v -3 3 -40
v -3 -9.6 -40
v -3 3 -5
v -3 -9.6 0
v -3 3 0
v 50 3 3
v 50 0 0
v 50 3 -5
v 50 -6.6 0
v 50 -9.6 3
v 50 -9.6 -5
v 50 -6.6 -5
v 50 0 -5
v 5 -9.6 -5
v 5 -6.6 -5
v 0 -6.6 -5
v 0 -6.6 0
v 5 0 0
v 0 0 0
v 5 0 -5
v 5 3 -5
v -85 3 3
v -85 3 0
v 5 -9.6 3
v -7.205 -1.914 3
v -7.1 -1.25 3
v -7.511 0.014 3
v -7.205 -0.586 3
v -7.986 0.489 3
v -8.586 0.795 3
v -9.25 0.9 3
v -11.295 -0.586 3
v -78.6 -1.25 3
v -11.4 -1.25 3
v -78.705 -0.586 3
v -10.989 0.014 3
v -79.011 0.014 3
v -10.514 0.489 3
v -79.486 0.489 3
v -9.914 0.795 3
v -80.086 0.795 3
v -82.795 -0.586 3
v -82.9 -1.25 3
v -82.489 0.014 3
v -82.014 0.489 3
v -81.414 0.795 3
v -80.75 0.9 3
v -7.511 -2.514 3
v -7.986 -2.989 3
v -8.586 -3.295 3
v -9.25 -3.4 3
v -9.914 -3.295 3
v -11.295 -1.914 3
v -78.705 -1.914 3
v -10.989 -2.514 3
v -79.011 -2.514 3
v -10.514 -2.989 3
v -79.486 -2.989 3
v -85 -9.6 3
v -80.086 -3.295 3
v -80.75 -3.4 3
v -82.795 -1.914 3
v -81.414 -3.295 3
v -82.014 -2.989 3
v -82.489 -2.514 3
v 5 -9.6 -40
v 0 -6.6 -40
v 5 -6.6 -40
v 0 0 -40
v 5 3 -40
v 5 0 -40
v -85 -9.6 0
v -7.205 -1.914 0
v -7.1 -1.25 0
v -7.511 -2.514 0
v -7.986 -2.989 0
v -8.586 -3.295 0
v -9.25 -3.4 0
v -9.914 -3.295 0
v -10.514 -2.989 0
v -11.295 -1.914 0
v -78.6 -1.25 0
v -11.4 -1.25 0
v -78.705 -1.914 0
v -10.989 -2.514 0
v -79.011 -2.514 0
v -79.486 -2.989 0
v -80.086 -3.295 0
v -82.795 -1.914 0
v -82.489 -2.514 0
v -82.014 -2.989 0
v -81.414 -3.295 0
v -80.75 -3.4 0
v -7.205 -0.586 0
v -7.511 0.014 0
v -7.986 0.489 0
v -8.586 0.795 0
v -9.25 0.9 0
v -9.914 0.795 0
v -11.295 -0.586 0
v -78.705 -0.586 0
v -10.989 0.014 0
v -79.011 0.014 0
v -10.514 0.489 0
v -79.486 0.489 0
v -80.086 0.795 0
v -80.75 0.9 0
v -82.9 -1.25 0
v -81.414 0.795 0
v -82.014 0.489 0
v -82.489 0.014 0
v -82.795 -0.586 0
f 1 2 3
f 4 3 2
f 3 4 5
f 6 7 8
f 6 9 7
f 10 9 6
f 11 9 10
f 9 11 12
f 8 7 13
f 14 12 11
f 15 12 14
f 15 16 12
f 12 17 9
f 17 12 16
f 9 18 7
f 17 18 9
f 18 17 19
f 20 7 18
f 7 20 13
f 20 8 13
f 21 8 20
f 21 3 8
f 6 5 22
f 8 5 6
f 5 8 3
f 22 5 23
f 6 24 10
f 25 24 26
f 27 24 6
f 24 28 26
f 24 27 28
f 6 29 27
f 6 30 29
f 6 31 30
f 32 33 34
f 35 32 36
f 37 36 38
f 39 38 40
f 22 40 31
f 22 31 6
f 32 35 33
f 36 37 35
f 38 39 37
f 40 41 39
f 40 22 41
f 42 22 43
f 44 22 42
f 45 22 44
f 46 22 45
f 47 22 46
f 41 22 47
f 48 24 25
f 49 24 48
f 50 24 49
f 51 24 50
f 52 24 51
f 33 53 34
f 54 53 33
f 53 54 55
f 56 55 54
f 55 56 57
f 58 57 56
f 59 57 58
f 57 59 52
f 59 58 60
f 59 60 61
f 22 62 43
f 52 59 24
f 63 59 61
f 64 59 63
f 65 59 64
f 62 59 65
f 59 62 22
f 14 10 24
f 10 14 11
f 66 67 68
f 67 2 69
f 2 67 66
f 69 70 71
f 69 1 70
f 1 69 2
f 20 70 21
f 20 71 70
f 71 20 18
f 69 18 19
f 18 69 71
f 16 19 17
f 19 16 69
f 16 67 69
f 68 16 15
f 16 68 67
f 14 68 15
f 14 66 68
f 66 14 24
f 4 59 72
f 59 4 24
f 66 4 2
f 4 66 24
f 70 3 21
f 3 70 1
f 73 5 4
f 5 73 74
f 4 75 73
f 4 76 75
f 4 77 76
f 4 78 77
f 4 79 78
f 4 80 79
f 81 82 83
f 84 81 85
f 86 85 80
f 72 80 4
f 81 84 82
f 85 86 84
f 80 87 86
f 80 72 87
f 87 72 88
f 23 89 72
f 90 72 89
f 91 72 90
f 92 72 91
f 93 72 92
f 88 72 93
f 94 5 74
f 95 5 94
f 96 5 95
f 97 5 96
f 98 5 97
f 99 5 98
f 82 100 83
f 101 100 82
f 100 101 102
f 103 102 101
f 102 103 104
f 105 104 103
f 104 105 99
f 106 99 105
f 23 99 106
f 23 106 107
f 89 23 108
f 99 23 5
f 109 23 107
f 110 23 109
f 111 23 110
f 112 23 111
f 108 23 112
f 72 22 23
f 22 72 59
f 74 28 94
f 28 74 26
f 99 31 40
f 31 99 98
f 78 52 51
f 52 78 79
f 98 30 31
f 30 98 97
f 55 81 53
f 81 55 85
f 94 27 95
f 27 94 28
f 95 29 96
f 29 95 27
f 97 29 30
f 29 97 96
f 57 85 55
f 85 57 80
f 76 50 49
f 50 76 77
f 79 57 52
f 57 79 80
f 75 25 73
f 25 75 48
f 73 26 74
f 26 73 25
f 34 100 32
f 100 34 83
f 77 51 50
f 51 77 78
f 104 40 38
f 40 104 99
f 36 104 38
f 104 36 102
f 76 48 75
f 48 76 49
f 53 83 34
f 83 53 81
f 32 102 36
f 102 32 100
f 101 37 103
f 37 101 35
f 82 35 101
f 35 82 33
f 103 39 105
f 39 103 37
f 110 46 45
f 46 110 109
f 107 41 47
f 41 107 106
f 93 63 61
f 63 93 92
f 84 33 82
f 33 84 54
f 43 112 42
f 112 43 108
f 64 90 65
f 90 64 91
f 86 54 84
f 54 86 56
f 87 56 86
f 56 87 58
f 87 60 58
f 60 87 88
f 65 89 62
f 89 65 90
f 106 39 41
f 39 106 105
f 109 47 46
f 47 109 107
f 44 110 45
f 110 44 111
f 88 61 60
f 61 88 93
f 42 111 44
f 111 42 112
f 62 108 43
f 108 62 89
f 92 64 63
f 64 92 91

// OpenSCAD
// [FL_INDEX: keywords="openscad, 3d_parametric, M2_80mm_fan_side_mount, csg_solid" | COT="Parametric OpenSCAD design from 3DCodeverse"]
// Title: M2 80mm fan side mount

/* [General] */
layout = "mount"; // [mount, clamptest]
wall_thickness = 3;

/* [Clamp Dimensions] */
// Extra clearance for the clamp. Print off the clamp test first to see what is right for you.
clamp_clearance = .1;
// X axis is front to back on the M2.
clamp_x_length = 50;
// Z is left to right across the M2. 40mm is about as far as you can go before the extruder carriage will clonk into the mount at the end of its travel.
clamp_z_length = 40;
// How far the clamp should extend inward from the edge. 5mm is about as far as you can go before contacting the V rail.
lip_depth = 5;
// Thickness of the gantry platform. You should not have to change this; edit clamp_clearance instead.
clamp_gap = 6.5;


/* [Fan Dimensions] */
// Exterior width of the fan.
fan_width = 80;
// How far off from the front face of the clamp you want to offset the fan by.
fan_offset = 2;
fan_screw_diameter = 4.3;
fan_screw_clearance = .2;
fan_depth = 25;
// Extra length for the fan pegs to extend beyond the face of the fan.
fan_depth_extra = 2;
fan_screw_centers_length = 71.5;

/* [Hidden] */
fan_screw_border = (fan_width - fan_screw_centers_length - fan_screw_diameter) / 2;
fan_screw_center_offset = fan_screw_border + fan_screw_diameter/2;
slop = .1; // for avoiding coincident faces

module clamp(h, c = clamp_clearance) {
  linear_extrude(height = h)
  difference() {
    translate([-wall_thickness, -wall_thickness])
    square([clamp_gap + c + 2*wall_thickness, lip_depth + wall_thickness]);

    square([clamp_gap + c, lip_depth + slop]);
  }
}

module screw_insert() {
  rotate([180, 0, 0])
  cylinder(h = fan_depth + fan_depth_extra, r = fan_screw_diameter/2 - fan_screw_clearance);
}


module mount() {
  right_screw_x = -wall_thickness - fan_offset - fan_screw_center_offset;
  screws_y = wall_thickness - fan_screw_center_offset;

  difference() {
    union() {
      // x clamp (front to back)
      rotate([-90, 0, -90])
      translate([0, 0, -wall_thickness])
      clamp(clamp_x_length + wall_thickness);

      // y clamp (left to right)
      rotate([180, 0, 90])
      translate([-(clamp_gap + clamp_clearance), 0, -wall_thickness])
      clamp(clamp_z_length + wall_thickness);

      // fan mount
      translate([-wall_thickness - fan_offset - fan_width, -clamp_gap - clamp_clearance - wall_thickness])
      cube([fan_offset + fan_width, clamp_gap + clamp_clearance + 2 * wall_thickness, wall_thickness]);


      /*
      translate([right_screw_x, screws_y, 0])
      screw_insert();

      translate([right_screw_x - fan_screw_centers_length, screws_y, 0])
      screw_insert();
      */
    }
    // Use 6-32 or 8-32 1 1/4" screws instead of printed holders
    translate([right_screw_x, screws_y, -slop])
    cylinder(h = wall_thickness + 2*slop, r = fan_screw_diameter/2, $fn = 20);

    translate([right_screw_x - fan_screw_centers_length, screws_y, -slop])
    cylinder(h = wall_thickness + 2*slop, r = fan_screw_diameter/2, $fn = 20);
  }
}

module clamp_test() {
  for (i = [0 : 3]) {
    translate([15 * i, 0]) clamp(10, -.1 + i * .1);
  }
}

if (layout == "clamptest") clamp_test();
else mount();

/*
module fan() {
  difference() {
    cube([fan_width, fan_width, fan_depth]);

    translate([fan_screw_center_offset, fan_screw_center_offset + fan_screw_centers_length, -slop])
    cylinder(h = fan_depth + 2 * slop, r = fan_screw_diameter/2);

    translate([fan_screw_center_offset + fan_screw_centers_length, fan_screw_center_offset + fan_screw_centers_length, -slop])
    cylinder(h = fan_depth + 2 * slop, r = fan_screw_diameter/2);
  }
}

%translate([-wall_thickness - fan_offset - fan_width, wall_thickness - fan_width, -fan_depth])
fan();
*/
